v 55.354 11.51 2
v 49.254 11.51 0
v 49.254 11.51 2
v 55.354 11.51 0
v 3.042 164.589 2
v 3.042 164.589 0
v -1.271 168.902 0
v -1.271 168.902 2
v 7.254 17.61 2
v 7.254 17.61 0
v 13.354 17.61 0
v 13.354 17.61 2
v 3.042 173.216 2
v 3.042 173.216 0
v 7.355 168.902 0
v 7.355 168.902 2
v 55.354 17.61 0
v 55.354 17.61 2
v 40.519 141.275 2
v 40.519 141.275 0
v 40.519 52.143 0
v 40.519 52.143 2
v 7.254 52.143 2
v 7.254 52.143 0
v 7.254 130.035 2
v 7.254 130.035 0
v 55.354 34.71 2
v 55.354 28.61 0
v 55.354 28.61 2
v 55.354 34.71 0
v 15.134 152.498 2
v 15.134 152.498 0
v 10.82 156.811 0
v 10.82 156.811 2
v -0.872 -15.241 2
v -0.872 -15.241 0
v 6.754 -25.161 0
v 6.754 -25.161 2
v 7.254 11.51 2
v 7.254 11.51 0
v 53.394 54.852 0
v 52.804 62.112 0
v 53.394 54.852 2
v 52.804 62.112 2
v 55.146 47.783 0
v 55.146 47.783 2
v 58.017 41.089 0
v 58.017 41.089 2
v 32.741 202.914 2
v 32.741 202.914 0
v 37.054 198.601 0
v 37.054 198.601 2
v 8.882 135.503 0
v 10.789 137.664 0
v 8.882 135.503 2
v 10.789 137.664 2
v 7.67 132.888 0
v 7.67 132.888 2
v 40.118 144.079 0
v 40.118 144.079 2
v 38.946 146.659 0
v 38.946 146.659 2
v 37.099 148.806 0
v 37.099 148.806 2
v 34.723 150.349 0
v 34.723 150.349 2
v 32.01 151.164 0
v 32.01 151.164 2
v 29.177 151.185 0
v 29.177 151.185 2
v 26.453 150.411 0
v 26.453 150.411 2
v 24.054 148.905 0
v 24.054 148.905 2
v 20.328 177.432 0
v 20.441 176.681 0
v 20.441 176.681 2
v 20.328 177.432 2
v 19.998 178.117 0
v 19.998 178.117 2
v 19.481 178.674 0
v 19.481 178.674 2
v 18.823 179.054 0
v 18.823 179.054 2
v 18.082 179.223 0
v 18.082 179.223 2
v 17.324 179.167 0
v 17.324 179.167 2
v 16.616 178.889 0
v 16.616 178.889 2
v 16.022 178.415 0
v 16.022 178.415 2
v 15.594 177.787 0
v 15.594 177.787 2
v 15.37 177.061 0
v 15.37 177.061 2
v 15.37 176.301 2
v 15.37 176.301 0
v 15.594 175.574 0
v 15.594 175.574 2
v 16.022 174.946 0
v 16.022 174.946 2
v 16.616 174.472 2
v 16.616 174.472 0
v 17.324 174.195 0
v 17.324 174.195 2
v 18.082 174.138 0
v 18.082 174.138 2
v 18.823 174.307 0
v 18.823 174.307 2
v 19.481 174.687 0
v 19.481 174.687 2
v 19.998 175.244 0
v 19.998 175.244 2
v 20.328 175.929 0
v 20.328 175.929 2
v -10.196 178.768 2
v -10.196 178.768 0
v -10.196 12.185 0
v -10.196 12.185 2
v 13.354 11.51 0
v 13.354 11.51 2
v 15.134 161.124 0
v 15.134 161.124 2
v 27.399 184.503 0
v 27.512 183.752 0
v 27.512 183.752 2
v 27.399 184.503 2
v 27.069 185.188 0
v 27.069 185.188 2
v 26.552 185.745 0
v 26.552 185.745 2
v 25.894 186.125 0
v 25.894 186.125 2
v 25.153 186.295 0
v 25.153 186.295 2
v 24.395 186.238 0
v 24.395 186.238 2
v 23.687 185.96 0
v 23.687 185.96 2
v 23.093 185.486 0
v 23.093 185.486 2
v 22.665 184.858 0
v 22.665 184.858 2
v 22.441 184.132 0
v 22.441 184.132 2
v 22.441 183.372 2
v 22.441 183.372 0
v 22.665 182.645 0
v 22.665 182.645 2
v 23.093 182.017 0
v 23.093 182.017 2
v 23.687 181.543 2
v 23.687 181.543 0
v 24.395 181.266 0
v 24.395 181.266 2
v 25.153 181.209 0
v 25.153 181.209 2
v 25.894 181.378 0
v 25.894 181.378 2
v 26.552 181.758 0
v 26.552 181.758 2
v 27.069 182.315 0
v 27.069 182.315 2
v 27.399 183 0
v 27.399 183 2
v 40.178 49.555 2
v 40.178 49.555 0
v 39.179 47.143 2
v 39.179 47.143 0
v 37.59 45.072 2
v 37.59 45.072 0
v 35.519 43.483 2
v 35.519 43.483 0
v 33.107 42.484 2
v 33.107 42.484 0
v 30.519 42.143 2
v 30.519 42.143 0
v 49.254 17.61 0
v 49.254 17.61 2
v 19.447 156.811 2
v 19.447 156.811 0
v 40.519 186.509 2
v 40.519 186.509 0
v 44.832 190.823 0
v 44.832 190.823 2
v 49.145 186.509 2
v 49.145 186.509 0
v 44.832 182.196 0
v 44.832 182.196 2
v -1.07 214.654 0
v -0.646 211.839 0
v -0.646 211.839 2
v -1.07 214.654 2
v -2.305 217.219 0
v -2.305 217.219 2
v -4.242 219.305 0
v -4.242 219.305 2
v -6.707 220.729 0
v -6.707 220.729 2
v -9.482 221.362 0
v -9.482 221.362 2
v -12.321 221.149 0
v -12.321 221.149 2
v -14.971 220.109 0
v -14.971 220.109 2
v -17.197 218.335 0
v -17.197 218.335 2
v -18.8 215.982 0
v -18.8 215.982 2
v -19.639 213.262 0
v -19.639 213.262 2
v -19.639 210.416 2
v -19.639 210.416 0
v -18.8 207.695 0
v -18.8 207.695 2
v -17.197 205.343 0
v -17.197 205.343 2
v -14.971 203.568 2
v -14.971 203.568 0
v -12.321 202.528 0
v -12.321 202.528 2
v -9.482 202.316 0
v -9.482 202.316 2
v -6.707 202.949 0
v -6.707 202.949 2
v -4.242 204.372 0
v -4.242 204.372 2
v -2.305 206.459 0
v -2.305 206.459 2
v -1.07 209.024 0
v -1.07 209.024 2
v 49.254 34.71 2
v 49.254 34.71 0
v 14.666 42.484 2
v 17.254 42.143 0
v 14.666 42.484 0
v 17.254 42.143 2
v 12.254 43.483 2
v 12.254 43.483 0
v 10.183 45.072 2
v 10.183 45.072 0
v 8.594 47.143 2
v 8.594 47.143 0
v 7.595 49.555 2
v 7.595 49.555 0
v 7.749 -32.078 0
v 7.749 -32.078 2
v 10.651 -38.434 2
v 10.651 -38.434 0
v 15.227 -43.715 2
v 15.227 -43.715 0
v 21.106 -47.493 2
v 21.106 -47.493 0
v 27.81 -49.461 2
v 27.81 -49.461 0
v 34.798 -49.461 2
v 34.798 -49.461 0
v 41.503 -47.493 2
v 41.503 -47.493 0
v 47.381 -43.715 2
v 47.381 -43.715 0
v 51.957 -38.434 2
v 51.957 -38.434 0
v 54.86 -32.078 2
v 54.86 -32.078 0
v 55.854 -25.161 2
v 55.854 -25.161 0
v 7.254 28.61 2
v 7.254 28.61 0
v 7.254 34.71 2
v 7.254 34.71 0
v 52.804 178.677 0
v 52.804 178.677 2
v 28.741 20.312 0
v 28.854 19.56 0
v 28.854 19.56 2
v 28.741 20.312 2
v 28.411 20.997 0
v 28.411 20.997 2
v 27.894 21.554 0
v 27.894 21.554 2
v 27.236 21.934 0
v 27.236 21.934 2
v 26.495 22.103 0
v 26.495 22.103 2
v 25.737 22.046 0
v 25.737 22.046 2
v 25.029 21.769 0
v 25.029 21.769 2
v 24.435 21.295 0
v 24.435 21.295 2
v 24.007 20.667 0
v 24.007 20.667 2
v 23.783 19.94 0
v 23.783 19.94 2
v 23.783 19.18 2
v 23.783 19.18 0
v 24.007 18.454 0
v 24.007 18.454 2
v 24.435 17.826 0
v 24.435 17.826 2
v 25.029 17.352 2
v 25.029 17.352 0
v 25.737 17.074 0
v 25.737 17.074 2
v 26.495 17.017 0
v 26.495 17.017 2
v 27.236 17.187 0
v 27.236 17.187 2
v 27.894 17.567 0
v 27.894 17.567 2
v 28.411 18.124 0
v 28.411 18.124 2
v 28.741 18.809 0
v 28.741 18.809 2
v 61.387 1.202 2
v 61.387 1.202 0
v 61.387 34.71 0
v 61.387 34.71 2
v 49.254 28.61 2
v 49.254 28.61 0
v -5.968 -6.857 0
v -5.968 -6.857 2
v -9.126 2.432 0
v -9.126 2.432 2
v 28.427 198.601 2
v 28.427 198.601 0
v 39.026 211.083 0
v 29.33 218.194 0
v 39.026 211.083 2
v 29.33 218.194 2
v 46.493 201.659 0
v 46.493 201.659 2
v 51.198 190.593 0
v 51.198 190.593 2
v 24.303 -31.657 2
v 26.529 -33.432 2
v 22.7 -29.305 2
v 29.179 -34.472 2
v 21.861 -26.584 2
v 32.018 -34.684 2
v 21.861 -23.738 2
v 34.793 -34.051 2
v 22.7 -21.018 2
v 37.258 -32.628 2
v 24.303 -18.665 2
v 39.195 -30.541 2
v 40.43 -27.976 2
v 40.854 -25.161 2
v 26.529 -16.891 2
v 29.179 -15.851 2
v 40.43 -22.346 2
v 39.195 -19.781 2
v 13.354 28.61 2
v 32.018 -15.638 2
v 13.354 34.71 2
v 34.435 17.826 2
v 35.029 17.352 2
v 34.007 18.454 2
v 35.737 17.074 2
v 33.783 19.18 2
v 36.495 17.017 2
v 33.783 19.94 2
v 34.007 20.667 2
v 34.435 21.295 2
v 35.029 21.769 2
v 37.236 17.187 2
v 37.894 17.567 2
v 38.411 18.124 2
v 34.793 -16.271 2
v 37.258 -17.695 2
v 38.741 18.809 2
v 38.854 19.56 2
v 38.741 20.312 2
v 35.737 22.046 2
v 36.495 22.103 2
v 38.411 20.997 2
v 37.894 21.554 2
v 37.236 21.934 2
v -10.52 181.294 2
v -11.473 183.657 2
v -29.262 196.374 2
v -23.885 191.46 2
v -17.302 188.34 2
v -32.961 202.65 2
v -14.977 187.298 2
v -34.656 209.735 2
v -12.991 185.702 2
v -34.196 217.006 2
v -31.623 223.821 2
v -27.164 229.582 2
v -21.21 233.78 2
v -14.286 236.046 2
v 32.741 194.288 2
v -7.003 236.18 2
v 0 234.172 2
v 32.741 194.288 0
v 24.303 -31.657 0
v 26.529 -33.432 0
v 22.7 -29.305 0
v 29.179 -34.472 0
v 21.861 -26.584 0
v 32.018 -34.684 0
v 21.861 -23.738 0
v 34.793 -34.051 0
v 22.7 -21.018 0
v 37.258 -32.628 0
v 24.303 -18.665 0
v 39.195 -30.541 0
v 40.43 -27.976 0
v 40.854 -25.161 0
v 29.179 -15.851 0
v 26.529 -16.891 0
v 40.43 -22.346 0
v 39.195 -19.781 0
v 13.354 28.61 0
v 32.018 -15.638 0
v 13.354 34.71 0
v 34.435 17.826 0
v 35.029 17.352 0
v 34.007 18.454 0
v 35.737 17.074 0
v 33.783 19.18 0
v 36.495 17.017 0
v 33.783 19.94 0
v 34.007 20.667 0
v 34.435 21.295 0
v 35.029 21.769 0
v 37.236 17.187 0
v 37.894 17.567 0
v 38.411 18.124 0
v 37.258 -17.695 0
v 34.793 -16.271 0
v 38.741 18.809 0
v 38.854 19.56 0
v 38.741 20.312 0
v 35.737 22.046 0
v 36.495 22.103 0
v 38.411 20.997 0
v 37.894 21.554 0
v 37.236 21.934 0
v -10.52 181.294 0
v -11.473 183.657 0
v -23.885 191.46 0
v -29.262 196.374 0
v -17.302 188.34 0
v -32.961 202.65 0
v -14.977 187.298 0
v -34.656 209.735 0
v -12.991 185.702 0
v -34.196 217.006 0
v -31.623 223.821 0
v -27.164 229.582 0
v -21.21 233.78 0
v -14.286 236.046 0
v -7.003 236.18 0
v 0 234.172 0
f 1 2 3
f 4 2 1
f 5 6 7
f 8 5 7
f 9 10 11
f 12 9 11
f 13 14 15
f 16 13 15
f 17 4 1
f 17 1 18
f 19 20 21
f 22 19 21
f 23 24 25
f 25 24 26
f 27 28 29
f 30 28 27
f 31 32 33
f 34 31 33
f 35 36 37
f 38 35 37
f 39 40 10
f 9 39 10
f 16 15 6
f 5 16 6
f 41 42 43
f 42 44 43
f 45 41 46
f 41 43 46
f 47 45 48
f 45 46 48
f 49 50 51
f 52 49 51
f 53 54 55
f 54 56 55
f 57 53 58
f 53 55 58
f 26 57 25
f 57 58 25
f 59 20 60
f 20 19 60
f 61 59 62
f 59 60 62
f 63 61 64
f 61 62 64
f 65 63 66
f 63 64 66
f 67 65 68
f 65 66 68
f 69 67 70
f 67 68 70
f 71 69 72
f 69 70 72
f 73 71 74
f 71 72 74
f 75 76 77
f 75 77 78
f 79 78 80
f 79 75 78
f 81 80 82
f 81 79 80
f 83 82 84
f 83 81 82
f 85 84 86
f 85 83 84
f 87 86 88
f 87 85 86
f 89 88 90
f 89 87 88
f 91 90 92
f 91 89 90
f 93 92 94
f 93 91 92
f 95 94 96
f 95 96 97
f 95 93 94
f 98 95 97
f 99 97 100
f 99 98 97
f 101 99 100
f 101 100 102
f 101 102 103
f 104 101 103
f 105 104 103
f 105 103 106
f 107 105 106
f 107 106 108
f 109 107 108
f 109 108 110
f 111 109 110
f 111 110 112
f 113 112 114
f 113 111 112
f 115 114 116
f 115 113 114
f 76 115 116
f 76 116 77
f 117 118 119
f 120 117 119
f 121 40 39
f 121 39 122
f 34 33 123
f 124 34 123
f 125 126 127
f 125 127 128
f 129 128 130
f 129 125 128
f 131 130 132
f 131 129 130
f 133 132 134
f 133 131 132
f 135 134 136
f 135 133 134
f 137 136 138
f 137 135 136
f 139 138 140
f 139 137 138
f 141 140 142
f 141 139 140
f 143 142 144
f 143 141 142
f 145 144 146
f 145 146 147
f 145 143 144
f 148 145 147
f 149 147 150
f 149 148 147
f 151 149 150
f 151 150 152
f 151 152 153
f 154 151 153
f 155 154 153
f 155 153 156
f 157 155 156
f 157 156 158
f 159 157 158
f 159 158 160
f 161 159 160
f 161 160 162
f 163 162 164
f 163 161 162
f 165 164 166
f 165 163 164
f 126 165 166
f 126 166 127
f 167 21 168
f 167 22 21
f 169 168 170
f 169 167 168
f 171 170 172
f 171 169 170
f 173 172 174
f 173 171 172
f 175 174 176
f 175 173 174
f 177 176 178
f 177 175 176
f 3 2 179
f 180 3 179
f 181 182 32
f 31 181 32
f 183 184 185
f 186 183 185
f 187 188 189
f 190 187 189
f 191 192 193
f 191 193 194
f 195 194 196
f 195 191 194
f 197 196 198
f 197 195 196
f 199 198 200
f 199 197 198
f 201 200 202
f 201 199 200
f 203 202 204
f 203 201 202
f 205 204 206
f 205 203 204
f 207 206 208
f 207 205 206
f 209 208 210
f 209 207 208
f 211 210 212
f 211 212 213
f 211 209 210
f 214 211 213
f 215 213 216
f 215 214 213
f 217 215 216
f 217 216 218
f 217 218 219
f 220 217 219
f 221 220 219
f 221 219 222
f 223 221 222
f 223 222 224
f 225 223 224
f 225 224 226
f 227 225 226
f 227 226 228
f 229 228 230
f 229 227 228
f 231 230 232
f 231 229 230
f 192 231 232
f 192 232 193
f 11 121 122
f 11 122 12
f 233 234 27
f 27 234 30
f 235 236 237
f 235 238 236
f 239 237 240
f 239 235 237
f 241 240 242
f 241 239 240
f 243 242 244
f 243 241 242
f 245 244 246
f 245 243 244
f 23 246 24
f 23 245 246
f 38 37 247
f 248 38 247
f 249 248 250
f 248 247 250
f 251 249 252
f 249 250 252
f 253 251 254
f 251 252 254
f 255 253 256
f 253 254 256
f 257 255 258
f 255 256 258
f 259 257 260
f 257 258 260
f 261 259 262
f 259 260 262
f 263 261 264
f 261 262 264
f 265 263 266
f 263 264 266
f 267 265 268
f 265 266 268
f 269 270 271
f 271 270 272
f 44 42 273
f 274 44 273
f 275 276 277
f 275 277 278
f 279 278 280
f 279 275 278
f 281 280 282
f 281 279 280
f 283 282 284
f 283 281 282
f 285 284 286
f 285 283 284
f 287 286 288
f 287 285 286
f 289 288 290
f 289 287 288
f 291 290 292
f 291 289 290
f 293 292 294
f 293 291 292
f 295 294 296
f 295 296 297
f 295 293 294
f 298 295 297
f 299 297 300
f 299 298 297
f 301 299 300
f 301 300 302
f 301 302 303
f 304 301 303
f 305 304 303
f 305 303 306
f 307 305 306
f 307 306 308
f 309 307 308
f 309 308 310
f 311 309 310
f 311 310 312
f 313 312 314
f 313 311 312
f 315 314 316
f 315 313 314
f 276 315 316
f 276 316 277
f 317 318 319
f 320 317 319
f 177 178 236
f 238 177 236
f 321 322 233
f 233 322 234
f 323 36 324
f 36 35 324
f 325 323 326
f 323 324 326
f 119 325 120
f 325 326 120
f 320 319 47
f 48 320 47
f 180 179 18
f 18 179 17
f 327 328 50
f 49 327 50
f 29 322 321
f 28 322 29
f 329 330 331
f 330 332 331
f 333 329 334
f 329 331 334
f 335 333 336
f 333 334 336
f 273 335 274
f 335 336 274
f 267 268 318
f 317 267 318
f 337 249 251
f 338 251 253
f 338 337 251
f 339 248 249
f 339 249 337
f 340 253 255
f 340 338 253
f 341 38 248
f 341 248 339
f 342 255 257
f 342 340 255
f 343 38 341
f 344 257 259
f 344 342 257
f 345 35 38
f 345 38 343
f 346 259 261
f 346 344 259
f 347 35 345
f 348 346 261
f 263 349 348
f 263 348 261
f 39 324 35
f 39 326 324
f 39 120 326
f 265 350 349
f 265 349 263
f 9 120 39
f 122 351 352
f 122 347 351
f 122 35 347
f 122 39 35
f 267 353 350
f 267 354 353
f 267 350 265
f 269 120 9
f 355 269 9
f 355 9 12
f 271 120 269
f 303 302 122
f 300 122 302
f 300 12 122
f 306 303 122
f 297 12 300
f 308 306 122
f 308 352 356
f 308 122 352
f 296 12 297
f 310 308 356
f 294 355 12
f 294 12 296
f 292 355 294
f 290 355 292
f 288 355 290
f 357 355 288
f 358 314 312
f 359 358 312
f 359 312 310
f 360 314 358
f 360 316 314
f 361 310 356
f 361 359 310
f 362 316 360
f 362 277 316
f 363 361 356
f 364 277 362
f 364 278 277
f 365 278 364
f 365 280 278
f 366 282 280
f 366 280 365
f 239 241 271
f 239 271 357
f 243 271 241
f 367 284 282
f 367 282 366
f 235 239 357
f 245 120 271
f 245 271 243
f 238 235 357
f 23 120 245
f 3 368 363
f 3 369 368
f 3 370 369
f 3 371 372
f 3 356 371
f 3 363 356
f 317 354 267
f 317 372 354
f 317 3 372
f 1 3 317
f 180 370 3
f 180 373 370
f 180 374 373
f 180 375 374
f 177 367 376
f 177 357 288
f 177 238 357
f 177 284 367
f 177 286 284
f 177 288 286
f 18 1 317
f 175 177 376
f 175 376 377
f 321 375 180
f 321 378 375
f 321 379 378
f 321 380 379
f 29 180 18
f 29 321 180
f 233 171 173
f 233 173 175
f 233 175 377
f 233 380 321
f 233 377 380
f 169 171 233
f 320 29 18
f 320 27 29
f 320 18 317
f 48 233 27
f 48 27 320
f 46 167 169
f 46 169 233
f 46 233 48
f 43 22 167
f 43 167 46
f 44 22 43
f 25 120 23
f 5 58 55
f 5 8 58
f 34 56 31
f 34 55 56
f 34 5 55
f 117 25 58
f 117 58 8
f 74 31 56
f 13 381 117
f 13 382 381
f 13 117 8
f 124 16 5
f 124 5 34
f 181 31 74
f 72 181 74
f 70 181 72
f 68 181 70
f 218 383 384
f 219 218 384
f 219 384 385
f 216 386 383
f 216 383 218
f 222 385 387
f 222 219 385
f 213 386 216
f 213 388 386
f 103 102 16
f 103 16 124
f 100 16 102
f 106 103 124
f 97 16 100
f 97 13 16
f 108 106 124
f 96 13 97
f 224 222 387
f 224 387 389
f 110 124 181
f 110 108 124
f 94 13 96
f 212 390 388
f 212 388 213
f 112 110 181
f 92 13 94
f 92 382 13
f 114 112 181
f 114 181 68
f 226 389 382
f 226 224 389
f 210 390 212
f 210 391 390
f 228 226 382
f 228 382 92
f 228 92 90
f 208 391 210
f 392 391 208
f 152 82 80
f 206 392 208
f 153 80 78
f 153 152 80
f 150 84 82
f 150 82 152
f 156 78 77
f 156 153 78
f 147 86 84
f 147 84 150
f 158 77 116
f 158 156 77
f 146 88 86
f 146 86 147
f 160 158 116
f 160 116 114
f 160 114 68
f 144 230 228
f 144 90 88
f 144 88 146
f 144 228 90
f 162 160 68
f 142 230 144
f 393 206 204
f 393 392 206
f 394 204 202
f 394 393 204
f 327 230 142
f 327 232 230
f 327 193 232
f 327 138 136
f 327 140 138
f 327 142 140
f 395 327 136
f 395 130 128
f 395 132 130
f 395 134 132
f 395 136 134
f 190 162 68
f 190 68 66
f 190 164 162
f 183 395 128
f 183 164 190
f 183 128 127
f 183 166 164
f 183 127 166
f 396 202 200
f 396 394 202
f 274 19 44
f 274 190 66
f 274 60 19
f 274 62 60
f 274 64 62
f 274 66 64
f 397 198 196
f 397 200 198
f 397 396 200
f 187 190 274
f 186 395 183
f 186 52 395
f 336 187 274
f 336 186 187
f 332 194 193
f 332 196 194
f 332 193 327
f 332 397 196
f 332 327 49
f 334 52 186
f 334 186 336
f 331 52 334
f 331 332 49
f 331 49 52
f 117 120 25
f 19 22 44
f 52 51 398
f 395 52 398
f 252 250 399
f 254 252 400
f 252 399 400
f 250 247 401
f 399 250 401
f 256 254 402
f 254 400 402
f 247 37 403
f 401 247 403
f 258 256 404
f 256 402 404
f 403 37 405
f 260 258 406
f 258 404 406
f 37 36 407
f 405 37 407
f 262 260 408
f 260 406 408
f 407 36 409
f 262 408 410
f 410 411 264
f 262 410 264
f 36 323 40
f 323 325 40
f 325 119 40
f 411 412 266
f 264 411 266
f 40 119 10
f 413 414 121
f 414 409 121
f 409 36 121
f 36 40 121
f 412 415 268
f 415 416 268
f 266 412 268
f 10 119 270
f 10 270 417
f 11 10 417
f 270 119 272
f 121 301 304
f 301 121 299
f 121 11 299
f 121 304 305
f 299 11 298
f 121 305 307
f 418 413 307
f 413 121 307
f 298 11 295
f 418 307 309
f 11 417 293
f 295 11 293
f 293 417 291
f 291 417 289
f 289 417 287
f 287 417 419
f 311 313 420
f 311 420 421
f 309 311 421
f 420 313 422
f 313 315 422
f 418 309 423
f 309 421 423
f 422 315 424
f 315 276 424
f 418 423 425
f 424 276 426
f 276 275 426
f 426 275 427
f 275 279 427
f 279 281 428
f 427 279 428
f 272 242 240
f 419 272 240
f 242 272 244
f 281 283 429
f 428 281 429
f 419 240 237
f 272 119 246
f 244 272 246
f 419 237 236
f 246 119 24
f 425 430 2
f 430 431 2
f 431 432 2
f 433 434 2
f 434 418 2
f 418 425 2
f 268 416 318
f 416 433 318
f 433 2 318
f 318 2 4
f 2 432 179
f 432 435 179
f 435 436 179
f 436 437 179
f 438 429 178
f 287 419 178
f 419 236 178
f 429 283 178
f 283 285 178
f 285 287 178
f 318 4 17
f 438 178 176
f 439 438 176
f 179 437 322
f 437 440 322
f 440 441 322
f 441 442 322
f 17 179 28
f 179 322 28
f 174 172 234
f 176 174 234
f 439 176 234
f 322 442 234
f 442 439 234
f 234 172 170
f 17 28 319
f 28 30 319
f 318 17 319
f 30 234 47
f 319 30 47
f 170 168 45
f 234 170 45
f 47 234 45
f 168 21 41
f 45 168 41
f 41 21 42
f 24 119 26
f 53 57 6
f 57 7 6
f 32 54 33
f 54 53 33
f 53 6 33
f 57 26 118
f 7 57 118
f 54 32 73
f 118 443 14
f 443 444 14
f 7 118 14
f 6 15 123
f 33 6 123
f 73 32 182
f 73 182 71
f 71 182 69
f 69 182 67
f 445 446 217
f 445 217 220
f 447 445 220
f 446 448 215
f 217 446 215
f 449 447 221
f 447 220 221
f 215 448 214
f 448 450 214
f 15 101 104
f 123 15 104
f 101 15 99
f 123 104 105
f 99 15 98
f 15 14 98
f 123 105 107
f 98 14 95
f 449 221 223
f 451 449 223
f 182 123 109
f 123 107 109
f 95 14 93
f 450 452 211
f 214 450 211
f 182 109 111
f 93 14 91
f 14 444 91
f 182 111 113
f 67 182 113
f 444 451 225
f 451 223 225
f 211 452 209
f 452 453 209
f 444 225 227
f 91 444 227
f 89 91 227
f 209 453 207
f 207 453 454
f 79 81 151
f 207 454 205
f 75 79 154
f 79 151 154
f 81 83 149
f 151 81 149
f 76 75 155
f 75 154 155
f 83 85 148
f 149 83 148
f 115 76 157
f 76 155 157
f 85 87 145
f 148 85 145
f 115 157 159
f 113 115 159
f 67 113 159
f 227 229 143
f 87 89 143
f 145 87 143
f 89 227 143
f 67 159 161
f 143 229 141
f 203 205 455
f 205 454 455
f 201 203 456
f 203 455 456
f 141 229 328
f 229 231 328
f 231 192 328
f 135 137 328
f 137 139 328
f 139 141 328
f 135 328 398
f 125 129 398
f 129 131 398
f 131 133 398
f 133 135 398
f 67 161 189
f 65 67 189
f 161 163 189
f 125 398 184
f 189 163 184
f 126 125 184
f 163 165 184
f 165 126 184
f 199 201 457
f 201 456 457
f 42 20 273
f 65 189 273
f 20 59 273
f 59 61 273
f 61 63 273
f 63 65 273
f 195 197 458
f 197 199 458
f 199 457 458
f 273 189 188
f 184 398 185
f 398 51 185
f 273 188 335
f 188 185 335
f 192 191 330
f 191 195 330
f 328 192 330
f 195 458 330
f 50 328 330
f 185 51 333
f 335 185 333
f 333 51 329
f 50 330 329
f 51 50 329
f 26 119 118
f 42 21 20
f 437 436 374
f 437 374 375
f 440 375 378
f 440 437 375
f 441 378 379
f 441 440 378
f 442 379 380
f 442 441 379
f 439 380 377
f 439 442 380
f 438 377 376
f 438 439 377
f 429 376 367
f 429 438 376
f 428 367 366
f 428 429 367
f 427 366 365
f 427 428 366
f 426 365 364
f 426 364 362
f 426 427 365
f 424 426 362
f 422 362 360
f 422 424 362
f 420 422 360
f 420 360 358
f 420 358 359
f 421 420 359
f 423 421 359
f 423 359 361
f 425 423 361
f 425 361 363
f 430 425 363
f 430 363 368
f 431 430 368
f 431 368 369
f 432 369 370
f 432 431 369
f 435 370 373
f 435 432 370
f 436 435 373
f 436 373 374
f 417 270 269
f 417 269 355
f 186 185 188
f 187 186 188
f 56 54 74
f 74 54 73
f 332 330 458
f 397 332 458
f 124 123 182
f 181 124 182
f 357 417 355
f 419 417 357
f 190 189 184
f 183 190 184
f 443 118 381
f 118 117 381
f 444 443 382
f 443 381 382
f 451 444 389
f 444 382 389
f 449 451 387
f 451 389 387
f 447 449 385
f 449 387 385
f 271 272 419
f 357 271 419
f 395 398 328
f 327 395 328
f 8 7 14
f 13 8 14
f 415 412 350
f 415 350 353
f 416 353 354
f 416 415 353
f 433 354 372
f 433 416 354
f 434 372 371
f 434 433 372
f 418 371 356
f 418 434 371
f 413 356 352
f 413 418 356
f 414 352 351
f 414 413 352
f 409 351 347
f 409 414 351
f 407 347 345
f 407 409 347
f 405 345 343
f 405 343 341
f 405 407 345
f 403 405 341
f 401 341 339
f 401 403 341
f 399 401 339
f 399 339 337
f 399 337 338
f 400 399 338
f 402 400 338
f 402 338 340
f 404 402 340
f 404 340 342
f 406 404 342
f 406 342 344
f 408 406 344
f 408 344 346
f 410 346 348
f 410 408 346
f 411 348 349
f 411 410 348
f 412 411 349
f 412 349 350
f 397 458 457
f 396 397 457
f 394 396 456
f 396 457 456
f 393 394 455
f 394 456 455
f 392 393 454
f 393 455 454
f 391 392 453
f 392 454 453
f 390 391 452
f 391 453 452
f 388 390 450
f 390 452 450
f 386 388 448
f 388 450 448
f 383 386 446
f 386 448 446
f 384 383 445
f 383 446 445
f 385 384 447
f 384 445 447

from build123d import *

# Parameters (mm, degrees)
SKETCH_1_W      = 6.1
SKETCH_1_H      = 6.1
SKETCH_1_R      = 9.55
SKETCH_1_R_2    = 2.55
EXTRUDE_2_DEPTH = 2
FILLET_1_R      = 45
FILLET_2_R      = 10


with BuildPart() as part:
    # 草图1 → 凸台-拉伸2 (new body)
    with BuildSketch(Plane.XY):
        with BuildLine():
            Line((-10.195923298, 166.045688989), (-10.195923298, 93.338899377))
            Line((-10.195923298, 93.338899377), (-10.195923298, -3.112918115))
            Line((-10.195923298, -3.112918115), (6.754076702, -25.161100623))
            ThreePointArc((6.754076702, -25.161100623), (31.304076702, -49.711100623), (55.854076702, -25.161100623))
            Line((55.854076702, -25.161100623), (61.387071712, 1.202006387))
            Line((61.387071712, 1.202006387), (61.387071712, 34.710258927))
            Line((61.387071712, 34.710258927), (52.804076702, 50.954174352))
            Line((52.804076702, 50.954174352), (52.804076702, 93.338899377))
            Line((52.804076702, 93.338899377), (52.804076702, 205.407441872))
            Line((52.804076702, 205.407441872), (0, 234.171513377))
            ThreePointArc((0, 234.171513377), (-34.1851727, 217.056026281), (-10.195923298, 187.288899377))
            Line((-10.195923298, 187.288899377), (-10.195923298, 166.045688989))
        make_face()
        with Locations((10.304076702, 14.560258927)):
            Rectangle(SKETCH_1_W, SKETCH_1_H, mode=Mode.SUBTRACT)
        with Locations((10.304076702, 31.660258927)):
            Rectangle(SKETCH_1_W, SKETCH_1_H, mode=Mode.SUBTRACT)
        with Locations((31.304076702, -25.161100623)):
            Circle(SKETCH_1_R, mode=Mode.SUBTRACT)
        with Locations((26.304076702, 19.560258927)):
            Circle(SKETCH_1_R_2, mode=Mode.SUBTRACT)
        with Locations((36.304076702, 19.560258927)):
            Circle(SKETCH_1_R_2, mode=Mode.SUBTRACT)
        with Locations((52.304076702, 14.560258927)):
            Rectangle(SKETCH_1_W, SKETCH_1_H, mode=Mode.SUBTRACT)
        with Locations((52.304076702, 31.660258927)):
            Rectangle(SKETCH_1_W, SKETCH_1_H, mode=Mode.SUBTRACT)
        Polygon((7.355428358, 168.902414276), (3.042076993, 164.589062911), (-1.271274372, 168.902414276), (3.042076993, 173.215765641), align=None, mode=Mode.SUBTRACT)
        with Locations((-10.195923298, 211.838899377)):
            Circle(SKETCH_1_R, mode=Mode.SUBTRACT)
        Polygon((40.518736396, 42.143243143), (7.254076702, 42.143243143), (7.254076702, 134.668841545), (40.518736396, 162.856651297), align=None, mode=Mode.SUBTRACT)
        Polygon((19.446954316, 156.810888318), (15.133602951, 152.497536952), (10.820251586, 156.810888318), (15.133602951, 161.124239683), align=None, mode=Mode.SUBTRACT)
        with Locations((17.891319398, 176.680588869)):
            Circle(SKETCH_1_R_2, mode=Mode.SUBTRACT)
        with Locations((24.96238721, 183.751656681)):
            Circle(SKETCH_1_R_2, mode=Mode.SUBTRACT)
        Polygon((32.740561803, 202.914250451), (37.053913168, 198.600899086), (32.740561803, 194.28754772), (28.427210437, 198.600899086), align=None, mode=Mode.SUBTRACT)
        Polygon((49.145439126, 186.509373127), (44.832087761, 182.196021762), (40.518736396, 186.509373127), (44.832087761, 190.822724493), align=None, mode=Mode.SUBTRACT)
    extrude(amount=EXTRUDE_2_DEPTH)

    # 圆角1
    fillet_1_edges = [part.edges().sort_by_distance(p)[0] for p in [
        (52.804076702, 205.407441872, 1),
        (52.804076702, 50.954174352, 1),
        (-10.195923298, -3.112918115, 1),
    ]]
    fillet(fillet_1_edges, radius=FILLET_1_R)

    # 圆角2
    fillet_2_edges = [part.edges().sort_by_distance(p)[0] for p in [
        (40.518736396, 162.856651297, 1),
        (7.254076702, 134.668841545, 1),
        (7.254076702, 42.143243143, 1),
        (40.518736396, 42.143243143, 1),
        (-10.195923298, 187.288899377, 1),
    ]]
    fillet(fillet_2_edges, radius=FILLET_2_R)


solid = part.part
